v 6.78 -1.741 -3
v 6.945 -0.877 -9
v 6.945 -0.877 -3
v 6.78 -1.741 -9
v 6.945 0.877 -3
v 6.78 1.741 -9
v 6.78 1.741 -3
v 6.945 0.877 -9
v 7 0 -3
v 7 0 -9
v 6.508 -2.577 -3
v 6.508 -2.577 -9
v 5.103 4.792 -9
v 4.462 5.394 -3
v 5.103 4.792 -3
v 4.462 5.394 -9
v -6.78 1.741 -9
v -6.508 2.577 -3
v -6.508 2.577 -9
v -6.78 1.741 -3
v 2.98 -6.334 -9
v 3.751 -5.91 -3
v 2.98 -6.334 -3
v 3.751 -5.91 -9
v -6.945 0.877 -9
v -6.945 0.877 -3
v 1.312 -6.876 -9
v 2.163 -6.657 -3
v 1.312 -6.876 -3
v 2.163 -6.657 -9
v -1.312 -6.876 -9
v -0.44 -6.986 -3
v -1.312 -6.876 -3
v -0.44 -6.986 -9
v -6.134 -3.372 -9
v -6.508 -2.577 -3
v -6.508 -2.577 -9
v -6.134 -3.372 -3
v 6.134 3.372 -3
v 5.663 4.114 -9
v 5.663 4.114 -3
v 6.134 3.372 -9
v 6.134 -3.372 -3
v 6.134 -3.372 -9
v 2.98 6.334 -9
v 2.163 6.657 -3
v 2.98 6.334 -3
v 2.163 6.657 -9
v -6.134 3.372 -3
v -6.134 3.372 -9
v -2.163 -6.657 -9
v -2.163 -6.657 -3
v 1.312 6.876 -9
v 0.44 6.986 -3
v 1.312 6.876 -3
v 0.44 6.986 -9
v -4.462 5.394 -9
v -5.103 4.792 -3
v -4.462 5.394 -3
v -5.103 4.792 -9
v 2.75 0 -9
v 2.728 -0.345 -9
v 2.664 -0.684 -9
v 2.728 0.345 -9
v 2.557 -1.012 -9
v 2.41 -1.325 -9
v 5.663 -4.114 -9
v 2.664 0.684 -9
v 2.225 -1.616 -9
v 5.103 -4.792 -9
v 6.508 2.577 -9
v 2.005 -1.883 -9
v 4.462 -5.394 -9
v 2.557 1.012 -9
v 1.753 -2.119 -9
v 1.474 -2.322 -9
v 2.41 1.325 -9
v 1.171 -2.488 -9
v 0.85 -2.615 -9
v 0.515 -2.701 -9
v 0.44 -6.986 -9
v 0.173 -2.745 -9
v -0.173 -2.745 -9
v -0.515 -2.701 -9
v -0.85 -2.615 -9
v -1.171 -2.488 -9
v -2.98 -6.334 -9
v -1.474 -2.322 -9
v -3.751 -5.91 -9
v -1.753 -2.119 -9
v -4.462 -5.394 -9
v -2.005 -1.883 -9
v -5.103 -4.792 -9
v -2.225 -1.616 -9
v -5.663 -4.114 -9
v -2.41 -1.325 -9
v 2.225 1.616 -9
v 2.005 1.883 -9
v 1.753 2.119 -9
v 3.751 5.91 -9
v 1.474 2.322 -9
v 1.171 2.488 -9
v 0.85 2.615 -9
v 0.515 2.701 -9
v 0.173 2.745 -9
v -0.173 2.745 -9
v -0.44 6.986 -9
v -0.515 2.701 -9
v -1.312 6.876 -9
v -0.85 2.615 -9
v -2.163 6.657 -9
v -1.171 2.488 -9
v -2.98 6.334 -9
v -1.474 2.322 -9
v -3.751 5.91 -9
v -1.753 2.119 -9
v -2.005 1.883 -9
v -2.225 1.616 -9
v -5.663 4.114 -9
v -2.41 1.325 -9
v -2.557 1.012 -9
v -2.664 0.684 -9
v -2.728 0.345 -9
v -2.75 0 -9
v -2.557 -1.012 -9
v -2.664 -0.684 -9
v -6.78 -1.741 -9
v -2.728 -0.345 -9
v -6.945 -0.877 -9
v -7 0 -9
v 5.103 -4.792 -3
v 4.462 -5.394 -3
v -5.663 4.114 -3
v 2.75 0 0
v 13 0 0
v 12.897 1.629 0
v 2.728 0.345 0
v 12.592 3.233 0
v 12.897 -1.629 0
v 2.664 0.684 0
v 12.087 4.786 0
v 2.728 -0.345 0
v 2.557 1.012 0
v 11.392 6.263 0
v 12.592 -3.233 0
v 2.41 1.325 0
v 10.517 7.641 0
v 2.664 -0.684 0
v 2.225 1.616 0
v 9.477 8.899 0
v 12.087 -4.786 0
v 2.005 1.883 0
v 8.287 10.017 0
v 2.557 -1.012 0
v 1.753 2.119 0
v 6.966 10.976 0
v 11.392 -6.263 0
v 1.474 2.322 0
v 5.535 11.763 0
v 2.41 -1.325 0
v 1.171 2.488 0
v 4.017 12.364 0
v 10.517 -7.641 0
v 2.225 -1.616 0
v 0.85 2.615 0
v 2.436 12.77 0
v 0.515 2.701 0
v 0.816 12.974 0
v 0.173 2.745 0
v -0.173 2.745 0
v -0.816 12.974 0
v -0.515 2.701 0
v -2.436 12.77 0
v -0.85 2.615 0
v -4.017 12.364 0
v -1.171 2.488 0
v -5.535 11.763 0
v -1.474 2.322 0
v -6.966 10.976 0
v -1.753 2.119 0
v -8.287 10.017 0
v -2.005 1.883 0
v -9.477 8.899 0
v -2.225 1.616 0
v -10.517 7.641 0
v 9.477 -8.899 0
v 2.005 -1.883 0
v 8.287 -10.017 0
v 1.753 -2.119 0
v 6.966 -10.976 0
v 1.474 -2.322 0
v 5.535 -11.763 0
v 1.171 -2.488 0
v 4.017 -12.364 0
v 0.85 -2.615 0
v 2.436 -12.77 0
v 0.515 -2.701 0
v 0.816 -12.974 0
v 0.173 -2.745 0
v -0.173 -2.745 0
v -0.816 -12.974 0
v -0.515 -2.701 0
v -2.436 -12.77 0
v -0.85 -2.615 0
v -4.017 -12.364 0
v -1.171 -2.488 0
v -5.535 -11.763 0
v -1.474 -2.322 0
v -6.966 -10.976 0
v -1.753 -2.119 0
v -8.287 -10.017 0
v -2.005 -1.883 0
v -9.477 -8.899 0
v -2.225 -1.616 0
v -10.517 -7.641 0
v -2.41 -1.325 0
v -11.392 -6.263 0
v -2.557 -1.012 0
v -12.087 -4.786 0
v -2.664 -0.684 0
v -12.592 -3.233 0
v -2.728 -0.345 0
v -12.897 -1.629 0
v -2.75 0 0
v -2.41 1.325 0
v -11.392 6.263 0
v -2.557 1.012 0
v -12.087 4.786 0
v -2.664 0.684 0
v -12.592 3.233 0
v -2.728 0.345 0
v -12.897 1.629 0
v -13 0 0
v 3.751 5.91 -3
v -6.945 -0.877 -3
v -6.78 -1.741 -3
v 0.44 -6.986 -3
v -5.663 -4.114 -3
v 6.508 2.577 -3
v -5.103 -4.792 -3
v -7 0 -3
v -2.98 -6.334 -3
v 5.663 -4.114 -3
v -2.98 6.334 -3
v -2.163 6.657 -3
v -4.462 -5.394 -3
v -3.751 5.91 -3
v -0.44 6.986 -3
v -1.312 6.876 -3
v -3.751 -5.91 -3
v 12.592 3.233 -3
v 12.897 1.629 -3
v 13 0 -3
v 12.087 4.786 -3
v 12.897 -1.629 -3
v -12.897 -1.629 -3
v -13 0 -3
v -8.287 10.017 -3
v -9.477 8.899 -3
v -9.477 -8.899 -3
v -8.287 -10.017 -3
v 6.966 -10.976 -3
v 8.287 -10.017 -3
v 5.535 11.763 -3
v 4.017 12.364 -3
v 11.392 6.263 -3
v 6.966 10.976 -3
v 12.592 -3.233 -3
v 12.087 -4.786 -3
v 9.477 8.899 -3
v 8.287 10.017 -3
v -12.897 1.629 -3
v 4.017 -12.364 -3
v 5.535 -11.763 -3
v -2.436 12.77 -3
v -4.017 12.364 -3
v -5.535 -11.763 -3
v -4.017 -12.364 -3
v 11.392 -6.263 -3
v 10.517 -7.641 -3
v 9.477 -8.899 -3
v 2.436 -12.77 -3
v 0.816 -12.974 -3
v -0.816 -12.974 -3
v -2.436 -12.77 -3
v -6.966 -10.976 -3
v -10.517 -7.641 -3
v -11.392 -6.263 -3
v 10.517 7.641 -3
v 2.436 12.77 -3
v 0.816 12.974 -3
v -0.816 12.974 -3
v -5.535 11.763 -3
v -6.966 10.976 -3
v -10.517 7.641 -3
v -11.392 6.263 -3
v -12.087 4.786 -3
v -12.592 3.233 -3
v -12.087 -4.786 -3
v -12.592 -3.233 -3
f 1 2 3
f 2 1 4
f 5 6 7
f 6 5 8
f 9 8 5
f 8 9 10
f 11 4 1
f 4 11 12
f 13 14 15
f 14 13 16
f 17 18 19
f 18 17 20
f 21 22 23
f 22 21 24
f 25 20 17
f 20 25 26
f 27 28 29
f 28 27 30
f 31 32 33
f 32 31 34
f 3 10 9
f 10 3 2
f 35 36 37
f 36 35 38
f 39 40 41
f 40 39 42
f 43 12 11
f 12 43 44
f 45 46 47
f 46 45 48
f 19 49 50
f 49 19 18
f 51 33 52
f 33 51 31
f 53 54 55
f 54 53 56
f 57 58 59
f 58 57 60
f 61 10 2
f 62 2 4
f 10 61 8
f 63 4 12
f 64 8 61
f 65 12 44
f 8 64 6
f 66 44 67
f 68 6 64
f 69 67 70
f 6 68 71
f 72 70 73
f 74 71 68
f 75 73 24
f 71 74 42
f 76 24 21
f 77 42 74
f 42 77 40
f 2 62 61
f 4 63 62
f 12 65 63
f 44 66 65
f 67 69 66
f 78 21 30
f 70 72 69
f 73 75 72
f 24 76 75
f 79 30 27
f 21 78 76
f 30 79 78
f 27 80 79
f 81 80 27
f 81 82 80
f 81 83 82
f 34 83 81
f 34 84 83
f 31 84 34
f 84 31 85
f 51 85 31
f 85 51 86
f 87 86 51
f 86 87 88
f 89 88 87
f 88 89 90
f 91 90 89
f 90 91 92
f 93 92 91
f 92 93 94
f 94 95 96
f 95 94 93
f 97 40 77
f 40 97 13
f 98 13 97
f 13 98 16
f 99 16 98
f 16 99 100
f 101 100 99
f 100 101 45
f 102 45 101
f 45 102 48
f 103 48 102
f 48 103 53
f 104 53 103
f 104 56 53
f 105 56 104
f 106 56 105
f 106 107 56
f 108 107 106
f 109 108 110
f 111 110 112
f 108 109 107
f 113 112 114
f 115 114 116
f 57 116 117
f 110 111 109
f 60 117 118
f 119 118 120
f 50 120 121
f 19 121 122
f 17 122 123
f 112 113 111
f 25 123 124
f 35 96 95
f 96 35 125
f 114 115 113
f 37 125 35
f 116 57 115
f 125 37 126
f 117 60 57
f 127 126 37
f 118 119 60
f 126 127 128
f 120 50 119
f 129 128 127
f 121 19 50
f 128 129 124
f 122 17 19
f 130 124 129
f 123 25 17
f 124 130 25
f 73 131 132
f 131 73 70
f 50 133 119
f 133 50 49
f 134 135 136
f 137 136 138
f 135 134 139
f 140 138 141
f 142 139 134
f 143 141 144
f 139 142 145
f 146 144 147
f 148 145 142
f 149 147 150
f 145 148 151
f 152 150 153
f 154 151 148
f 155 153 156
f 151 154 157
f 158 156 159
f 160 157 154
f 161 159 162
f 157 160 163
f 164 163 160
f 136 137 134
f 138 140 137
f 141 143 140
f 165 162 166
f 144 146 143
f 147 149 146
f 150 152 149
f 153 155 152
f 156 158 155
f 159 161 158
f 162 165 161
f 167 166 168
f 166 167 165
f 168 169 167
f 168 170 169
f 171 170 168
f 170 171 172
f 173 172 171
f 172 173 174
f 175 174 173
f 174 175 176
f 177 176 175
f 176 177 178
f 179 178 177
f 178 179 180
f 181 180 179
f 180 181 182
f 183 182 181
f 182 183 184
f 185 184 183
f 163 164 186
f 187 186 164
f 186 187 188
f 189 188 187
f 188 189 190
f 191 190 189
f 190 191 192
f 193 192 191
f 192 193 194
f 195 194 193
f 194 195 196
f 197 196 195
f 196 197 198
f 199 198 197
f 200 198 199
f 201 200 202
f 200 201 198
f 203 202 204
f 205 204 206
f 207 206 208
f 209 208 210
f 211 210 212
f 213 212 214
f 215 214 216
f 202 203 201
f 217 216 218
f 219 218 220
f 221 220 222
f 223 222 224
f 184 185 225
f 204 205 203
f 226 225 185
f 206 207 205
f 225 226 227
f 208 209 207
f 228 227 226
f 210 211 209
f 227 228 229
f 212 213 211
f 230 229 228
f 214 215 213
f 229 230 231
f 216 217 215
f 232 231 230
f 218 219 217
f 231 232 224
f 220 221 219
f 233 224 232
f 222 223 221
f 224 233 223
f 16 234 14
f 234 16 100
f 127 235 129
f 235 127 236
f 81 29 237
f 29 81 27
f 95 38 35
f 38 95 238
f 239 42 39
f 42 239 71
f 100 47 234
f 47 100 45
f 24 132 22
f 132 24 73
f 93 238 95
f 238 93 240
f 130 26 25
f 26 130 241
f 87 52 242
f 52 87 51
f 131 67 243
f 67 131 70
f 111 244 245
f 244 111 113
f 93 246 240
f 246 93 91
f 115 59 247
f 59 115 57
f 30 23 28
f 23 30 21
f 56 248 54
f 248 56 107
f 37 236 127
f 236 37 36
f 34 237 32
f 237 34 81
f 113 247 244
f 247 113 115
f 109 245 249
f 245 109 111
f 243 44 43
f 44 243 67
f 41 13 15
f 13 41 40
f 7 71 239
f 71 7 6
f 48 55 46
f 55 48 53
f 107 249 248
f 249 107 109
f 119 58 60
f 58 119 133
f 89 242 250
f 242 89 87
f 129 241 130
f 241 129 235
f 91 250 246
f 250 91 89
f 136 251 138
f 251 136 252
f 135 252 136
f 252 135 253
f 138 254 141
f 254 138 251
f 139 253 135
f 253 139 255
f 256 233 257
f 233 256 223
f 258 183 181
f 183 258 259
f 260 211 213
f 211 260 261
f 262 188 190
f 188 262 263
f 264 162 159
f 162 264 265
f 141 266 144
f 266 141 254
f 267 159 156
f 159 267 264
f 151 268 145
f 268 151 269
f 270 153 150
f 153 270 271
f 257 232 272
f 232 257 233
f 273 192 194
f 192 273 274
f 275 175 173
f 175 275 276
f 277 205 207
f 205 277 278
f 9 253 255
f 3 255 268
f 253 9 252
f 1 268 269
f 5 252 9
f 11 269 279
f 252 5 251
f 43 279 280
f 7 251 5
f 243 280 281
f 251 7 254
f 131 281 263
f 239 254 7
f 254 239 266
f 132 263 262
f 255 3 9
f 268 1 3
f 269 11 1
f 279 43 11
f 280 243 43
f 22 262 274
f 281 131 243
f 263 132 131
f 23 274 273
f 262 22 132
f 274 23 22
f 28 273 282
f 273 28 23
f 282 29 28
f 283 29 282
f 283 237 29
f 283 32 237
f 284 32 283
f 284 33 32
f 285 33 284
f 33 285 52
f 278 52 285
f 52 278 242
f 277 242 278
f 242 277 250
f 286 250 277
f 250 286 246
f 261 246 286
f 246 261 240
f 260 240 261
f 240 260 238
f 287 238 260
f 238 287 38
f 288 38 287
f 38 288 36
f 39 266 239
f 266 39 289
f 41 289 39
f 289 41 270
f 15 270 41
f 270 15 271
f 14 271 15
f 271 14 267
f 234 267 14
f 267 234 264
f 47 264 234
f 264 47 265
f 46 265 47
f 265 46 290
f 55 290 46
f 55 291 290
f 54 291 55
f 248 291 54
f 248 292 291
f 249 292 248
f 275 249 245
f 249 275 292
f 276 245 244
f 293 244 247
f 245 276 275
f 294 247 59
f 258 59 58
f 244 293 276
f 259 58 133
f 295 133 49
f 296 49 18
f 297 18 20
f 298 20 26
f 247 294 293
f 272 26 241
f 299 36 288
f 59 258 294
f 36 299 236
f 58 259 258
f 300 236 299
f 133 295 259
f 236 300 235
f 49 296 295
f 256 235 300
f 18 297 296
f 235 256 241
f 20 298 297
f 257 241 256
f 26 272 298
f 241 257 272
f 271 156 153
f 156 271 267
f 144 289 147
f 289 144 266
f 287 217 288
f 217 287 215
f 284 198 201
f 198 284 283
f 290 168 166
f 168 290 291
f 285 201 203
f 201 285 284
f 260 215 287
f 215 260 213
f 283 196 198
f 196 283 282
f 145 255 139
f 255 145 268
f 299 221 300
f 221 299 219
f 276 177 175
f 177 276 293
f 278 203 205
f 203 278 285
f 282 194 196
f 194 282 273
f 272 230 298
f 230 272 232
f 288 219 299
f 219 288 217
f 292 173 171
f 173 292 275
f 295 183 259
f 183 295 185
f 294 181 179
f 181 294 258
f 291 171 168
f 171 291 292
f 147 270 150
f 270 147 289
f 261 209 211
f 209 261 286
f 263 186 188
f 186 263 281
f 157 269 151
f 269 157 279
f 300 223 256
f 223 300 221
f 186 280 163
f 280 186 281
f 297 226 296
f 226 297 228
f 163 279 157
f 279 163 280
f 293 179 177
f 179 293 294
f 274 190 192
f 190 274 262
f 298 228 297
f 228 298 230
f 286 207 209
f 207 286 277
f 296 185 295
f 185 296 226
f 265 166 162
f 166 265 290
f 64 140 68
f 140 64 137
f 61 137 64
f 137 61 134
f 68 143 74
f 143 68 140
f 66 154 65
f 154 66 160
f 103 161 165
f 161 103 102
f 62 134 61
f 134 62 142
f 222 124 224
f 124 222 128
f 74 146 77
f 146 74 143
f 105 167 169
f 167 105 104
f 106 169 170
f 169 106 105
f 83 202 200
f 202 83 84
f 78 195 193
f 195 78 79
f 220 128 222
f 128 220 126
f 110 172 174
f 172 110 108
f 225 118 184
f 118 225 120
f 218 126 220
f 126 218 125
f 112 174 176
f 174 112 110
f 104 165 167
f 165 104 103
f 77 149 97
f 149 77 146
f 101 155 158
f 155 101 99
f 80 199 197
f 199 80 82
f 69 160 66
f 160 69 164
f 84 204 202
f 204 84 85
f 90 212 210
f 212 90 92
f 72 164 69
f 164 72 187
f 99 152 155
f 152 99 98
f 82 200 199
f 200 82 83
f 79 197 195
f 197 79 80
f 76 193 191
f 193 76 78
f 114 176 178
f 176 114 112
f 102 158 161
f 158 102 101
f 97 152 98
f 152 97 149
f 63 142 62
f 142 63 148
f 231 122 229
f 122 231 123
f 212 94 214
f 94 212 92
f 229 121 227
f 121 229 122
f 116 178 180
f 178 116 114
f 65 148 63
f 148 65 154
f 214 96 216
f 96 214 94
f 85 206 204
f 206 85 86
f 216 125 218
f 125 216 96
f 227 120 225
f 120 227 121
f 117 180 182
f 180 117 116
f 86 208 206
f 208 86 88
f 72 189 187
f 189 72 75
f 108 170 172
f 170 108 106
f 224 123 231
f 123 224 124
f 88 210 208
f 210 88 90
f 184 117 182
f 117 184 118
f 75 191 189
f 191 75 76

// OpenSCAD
$fn = 50;


difference() {
	union() {
		translate(v = [0, 0, -9.0000000000]) {
			cylinder(h = 9, r = 7.0000000000);
		}
		translate(v = [0, 0, -3.0000000000]) {
			cylinder(h = 3, r = 13.0000000000);
		}
	}
	union() {
		#translate(v = [0, 0, -9]) {
			cylinder(h = 9, r = 2.7500000000);
		}
	}
}
